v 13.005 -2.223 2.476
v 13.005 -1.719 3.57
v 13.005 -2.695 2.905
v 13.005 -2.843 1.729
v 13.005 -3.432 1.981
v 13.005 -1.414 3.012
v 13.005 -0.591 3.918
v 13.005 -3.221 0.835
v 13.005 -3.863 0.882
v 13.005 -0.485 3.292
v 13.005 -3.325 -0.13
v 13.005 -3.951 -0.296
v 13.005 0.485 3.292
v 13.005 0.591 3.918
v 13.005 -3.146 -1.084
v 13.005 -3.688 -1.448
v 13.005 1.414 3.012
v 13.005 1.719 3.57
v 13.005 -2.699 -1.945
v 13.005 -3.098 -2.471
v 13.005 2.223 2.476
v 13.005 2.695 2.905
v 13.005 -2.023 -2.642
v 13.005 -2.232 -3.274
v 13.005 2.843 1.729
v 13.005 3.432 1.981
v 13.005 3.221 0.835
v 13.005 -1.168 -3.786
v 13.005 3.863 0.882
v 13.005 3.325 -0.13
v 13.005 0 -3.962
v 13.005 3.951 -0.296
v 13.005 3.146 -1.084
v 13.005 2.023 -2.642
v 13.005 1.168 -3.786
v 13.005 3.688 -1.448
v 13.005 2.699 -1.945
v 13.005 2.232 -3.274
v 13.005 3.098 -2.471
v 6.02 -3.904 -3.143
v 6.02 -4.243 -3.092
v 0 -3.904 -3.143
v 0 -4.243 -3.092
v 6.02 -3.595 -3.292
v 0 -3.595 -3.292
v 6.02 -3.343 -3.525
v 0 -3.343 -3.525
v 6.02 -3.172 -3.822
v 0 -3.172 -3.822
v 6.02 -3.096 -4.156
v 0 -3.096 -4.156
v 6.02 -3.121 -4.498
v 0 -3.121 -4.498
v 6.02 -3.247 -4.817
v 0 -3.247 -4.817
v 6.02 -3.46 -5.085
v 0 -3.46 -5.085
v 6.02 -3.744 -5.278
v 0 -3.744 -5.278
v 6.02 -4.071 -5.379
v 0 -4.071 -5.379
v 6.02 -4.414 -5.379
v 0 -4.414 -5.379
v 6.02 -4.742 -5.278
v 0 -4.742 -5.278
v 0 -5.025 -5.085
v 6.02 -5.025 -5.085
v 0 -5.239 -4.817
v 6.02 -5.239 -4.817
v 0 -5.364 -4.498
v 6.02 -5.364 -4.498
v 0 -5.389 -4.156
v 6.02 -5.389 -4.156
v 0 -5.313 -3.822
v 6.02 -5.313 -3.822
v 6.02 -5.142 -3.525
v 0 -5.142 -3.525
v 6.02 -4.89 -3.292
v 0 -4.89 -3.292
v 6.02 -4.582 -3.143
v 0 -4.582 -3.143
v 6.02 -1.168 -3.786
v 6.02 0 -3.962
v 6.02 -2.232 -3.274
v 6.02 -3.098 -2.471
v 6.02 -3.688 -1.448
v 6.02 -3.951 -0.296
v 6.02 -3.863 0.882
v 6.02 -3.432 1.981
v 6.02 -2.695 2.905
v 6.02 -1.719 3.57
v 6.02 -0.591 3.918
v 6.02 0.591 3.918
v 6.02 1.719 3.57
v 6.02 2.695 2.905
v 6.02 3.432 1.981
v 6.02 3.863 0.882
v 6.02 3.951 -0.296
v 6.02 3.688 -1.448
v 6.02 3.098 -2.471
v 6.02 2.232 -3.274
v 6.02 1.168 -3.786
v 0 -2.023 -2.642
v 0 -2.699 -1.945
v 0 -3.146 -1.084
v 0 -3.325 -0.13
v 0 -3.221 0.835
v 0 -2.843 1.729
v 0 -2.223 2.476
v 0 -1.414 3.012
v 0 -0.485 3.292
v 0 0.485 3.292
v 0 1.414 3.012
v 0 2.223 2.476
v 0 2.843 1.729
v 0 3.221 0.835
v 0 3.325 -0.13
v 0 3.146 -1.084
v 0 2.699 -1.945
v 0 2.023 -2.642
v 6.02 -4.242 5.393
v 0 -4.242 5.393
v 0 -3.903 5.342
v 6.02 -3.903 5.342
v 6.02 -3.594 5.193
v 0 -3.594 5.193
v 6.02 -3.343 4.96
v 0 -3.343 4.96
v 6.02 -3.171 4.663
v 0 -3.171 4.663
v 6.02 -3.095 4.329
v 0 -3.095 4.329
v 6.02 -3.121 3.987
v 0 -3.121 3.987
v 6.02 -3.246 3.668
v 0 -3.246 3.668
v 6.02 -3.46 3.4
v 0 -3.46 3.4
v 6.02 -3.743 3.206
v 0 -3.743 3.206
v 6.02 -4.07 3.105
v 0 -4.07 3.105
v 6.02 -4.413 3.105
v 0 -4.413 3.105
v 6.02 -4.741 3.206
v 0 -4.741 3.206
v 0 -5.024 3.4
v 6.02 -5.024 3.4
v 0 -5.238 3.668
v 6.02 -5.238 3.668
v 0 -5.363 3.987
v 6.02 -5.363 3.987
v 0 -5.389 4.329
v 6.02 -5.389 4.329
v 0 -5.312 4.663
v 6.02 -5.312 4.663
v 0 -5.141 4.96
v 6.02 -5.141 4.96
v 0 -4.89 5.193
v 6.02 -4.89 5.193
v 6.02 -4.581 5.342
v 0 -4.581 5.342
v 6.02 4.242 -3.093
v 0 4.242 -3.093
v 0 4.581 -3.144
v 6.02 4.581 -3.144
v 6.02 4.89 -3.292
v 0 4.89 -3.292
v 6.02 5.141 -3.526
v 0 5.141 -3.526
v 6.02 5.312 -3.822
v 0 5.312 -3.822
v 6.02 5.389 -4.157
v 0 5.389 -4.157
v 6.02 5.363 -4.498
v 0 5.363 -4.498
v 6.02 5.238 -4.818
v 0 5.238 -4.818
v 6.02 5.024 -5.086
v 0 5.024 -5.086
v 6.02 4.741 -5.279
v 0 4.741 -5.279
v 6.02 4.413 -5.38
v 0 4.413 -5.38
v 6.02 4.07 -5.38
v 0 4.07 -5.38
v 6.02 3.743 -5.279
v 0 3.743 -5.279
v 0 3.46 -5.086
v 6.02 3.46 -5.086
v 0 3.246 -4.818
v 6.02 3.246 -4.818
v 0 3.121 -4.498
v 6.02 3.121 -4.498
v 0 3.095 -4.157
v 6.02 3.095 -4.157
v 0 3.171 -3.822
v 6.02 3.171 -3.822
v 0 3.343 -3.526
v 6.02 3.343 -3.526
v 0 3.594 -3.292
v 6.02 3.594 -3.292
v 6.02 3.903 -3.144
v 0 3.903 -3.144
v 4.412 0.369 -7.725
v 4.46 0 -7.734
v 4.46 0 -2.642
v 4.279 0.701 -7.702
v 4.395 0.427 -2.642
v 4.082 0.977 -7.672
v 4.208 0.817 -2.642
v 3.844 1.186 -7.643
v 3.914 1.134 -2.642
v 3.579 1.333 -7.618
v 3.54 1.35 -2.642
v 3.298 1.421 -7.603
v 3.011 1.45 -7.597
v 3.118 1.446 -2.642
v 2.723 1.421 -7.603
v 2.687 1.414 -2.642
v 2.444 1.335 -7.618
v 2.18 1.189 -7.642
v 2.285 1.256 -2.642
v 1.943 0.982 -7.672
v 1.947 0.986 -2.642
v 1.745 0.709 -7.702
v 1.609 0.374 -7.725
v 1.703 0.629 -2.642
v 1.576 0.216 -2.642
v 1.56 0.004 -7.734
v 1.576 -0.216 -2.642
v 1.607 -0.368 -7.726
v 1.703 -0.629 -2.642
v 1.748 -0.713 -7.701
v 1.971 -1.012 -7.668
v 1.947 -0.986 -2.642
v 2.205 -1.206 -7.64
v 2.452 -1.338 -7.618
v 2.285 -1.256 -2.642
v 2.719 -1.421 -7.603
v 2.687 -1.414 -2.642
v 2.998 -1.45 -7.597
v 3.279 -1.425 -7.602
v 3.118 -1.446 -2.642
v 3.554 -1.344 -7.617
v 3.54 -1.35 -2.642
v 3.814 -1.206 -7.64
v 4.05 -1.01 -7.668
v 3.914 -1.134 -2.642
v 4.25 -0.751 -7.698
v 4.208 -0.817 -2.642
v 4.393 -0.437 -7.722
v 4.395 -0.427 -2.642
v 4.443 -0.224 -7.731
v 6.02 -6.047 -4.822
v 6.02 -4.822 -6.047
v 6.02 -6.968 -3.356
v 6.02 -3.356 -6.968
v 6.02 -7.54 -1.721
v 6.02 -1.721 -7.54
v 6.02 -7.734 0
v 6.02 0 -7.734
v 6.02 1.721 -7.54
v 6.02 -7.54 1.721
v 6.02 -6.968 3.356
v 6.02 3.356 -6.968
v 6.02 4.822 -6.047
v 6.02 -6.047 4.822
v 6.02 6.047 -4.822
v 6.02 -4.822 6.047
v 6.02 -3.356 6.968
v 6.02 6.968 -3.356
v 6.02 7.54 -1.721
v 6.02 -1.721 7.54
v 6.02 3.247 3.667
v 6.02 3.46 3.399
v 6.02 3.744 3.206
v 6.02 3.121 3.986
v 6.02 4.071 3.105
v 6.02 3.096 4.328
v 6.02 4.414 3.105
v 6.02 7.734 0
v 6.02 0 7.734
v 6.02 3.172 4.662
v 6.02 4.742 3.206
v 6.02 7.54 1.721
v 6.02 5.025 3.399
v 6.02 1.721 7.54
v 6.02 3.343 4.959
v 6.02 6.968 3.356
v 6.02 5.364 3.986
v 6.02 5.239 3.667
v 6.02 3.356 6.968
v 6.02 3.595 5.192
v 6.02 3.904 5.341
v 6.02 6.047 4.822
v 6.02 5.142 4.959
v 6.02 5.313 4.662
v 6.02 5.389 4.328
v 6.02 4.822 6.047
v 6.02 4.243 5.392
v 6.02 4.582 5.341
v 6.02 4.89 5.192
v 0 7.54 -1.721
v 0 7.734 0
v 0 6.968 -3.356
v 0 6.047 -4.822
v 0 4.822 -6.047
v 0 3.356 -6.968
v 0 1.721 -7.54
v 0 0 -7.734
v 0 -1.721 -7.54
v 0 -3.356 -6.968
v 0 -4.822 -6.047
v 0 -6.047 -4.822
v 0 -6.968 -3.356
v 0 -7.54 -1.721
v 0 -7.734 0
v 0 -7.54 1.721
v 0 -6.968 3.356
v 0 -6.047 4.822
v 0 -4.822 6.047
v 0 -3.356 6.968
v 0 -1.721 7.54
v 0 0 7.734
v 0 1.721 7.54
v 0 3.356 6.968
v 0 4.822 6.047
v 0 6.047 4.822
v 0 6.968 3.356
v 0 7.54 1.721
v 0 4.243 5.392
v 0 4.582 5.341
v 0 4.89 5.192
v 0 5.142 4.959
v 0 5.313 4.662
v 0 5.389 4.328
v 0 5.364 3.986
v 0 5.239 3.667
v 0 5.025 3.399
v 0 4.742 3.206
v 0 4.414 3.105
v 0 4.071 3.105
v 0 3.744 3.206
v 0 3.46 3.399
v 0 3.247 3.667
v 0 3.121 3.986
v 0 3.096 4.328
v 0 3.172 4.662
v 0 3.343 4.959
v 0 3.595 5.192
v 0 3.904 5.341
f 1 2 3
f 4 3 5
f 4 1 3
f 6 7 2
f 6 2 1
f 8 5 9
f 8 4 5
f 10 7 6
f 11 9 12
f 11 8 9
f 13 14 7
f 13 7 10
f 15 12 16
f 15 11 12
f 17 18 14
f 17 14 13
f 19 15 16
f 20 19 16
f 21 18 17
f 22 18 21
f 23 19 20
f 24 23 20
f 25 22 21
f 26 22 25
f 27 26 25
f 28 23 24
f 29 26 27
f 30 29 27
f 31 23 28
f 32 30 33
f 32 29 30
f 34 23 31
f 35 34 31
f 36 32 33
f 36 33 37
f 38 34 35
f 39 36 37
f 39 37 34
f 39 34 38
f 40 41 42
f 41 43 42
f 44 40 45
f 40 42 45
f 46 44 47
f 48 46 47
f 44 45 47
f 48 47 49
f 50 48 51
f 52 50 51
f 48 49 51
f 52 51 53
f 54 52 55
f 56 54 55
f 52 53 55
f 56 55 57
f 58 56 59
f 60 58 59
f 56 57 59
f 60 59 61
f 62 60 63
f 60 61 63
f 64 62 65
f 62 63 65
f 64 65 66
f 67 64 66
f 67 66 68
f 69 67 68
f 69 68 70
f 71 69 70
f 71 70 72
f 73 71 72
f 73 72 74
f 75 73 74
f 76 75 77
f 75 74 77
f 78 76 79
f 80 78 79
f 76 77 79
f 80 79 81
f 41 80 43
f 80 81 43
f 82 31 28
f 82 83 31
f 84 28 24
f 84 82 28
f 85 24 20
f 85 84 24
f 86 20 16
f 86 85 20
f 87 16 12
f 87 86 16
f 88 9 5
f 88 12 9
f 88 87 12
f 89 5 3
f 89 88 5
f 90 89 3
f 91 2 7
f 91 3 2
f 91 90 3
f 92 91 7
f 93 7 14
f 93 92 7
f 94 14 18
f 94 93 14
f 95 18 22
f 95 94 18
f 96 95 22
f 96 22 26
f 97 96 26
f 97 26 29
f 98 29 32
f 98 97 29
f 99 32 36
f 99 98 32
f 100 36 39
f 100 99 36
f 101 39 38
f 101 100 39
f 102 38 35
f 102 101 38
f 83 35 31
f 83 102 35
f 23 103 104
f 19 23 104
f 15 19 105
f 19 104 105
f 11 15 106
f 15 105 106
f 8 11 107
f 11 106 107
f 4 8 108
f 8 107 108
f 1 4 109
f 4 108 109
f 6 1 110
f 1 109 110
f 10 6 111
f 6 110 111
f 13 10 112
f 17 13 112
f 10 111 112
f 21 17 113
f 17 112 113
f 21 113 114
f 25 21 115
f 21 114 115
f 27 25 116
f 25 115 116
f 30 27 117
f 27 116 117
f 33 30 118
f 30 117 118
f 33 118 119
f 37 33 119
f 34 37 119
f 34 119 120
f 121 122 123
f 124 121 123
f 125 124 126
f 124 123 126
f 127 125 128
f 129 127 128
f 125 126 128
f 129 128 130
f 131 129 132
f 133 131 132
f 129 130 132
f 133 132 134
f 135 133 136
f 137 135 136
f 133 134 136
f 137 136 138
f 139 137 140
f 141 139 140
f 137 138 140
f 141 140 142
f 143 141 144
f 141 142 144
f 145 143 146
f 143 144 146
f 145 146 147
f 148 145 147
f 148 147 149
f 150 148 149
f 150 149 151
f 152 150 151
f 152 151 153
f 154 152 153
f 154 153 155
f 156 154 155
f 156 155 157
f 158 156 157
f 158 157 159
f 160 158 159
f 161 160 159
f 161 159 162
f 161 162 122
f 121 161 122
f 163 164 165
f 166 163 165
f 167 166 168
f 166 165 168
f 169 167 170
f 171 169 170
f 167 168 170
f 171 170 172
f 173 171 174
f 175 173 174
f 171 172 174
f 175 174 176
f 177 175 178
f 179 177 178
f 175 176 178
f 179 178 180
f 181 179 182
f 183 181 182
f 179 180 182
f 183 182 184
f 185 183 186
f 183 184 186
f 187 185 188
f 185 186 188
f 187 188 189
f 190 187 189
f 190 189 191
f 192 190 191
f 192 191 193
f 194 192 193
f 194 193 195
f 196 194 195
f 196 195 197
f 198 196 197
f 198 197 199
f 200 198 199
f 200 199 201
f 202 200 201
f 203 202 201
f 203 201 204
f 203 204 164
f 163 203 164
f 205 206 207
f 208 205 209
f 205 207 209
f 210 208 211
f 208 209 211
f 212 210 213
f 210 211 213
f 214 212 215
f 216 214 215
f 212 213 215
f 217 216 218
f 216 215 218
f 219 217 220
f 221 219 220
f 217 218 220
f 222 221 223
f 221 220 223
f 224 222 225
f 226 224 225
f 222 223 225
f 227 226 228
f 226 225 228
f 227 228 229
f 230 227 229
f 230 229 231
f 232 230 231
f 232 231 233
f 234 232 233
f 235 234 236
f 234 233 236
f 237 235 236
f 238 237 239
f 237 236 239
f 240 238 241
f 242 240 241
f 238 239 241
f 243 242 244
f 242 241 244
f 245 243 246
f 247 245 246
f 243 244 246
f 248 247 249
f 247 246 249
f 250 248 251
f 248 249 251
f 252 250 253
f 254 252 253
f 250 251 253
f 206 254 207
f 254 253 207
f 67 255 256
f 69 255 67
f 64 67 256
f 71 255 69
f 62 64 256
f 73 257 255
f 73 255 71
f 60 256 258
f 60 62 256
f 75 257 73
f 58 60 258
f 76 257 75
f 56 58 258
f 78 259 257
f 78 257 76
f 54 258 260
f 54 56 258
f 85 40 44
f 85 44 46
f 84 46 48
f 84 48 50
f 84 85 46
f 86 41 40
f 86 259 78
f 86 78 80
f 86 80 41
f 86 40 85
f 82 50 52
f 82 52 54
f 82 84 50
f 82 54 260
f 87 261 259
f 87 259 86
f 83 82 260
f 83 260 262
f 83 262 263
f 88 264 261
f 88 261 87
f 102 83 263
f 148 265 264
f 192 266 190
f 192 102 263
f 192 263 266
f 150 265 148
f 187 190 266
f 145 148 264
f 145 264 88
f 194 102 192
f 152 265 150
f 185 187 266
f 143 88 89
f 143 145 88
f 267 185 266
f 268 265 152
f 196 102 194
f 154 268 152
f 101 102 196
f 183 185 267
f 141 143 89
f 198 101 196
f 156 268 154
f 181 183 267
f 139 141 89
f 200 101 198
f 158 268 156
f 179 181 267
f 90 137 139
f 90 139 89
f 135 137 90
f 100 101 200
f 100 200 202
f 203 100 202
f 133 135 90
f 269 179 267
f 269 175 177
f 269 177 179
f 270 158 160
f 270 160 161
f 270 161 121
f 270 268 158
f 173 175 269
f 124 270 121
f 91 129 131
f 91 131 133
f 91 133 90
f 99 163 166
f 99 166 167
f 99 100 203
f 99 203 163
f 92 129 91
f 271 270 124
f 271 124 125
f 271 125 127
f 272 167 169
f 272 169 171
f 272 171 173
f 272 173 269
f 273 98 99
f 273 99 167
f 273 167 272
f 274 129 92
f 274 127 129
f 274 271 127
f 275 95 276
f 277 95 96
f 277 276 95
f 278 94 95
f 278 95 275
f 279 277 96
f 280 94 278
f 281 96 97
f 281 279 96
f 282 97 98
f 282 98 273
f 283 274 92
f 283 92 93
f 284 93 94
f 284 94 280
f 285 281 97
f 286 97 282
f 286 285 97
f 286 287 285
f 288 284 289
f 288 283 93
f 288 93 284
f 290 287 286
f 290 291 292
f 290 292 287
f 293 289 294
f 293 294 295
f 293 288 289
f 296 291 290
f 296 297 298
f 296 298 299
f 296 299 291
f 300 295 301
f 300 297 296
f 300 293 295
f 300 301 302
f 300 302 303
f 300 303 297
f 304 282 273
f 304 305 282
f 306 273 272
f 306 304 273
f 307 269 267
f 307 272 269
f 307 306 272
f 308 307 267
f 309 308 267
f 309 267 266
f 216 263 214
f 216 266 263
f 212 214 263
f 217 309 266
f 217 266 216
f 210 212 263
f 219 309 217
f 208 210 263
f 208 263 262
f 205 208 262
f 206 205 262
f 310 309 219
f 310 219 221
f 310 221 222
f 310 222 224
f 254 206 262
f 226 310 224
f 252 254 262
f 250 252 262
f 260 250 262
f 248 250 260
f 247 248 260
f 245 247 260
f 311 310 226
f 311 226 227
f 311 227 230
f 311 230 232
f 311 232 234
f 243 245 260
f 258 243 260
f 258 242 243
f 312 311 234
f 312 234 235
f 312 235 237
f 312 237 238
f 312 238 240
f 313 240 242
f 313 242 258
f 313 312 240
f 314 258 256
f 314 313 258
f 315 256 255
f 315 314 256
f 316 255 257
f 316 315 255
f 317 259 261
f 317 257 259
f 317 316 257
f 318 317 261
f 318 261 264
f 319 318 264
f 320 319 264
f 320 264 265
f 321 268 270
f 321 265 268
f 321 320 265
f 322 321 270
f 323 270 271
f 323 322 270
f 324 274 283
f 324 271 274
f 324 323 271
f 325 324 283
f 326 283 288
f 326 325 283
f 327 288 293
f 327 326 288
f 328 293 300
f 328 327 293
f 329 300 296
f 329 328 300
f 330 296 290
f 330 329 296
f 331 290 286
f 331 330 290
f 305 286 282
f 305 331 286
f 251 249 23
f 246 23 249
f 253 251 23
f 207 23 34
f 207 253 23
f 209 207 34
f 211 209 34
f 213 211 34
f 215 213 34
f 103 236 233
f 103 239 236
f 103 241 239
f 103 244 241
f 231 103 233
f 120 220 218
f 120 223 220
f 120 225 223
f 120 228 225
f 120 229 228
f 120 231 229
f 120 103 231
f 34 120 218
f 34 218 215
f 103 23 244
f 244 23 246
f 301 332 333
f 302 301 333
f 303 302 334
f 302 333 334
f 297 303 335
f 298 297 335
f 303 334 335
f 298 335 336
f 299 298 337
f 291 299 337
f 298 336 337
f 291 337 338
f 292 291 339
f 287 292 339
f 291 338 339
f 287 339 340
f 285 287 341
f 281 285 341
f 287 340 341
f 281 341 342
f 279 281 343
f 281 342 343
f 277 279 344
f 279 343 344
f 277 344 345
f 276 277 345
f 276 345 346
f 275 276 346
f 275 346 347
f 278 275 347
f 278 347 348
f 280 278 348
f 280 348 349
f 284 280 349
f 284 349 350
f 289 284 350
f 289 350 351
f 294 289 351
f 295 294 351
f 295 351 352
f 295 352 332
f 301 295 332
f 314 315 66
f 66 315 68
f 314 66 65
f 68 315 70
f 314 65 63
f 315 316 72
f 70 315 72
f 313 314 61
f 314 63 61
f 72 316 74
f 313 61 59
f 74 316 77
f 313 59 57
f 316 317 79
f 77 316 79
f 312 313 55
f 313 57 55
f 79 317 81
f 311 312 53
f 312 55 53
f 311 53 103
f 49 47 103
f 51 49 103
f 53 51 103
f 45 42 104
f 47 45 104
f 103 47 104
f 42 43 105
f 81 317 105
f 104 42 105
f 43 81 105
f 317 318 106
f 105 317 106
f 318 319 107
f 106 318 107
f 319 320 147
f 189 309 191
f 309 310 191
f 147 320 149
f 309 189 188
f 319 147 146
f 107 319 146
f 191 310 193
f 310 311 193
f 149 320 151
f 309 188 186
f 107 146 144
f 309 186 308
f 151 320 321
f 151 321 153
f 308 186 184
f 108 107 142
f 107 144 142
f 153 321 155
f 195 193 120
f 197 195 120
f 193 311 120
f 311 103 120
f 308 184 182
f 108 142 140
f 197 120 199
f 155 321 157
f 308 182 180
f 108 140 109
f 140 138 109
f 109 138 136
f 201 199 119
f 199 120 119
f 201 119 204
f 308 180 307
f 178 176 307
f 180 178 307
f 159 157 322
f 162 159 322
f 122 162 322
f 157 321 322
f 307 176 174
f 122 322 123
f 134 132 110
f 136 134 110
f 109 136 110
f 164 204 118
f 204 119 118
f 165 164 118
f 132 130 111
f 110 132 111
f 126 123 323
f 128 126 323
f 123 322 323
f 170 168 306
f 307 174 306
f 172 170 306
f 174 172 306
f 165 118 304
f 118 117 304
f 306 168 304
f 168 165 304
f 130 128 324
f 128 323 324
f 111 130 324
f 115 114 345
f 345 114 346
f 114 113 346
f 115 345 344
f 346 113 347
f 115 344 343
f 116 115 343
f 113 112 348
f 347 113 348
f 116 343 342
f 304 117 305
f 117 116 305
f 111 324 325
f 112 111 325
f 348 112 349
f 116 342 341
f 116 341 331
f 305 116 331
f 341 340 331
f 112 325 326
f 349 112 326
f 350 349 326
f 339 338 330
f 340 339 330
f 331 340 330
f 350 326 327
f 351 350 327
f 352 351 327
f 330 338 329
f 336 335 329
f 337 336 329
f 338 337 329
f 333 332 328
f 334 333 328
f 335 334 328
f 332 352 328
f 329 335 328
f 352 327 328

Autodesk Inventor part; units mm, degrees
ref_plane "YZ Plane" through (0, 0, 0) normal (1, 0, 0) x (0, 1, 0)
ref_plane "XZ Plane" through (0, 0, 0) normal (0, 1, 0) x (-1, 0, 0)
ref_plane "XY Plane" through (0, 0, 0) normal (0, 0, 1) x (1, 0, 0)
sketch "Sketch1" plane through (0, 0, 0) normal (1, 0, 0) x (0, 1, 0)
  circle A0 centre (0, 0) radius 7.7343
  dimension "d0" = 15.4686
extrude "Extrusion1" add sketch "Sketch1" along normal blind 6.0198
sketch "Sketch2" plane through (6.0198, 0, 0) normal (1, 0, 0) x (0, 0, -1)
  circle A0 centre (0, 0) radius 3.9624
  dimension "d3" = 7.9248
extrude "Extrusion2" add sketch "Sketch2" along normal blind 6.985
sketch "Sketch3" plane through (0, 0, 0) normal (-1, 0, 0) x (0, 0, 1)
  arc A0 (-2.6416, -2.0232) -> (-2.6416, 2.0232) centre (0, 0) ccw
  line L0 (-2.6416, -2.0232) -> (-2.6416, 2.0232)
  dimension "d6" = 6.6548
extrude "Extrusion3" cut sketch "Sketch3" against normal through all
sketch "Sketch4" plane through (0, 0, 0) normal (-1, 0, 0) x (0, 0, 1)
  circle A0 centre (-4.2426, 4.2418) radius 1.15
  circle A1 centre (0, 0) radius 6 construction
  circle A2 centre (-4.2418, -4.2426) radius 1.15
  circle A3 centre (4.2426, -4.2418) radius 1.15
  circle A4 centre (4.2418, 4.2426) radius 1.15
  dimension "d12" = 2.3
  dimension "d21" = 12
  dimension "d24" = 360
extrude "Extrusion4" cut sketch "Sketch4" against normal through all
sketch "Sketch5" plane through (0, -2.0232, -2.6416) normal (0, 0, 1) x (1, 0, 0)
  circle A0 centre (3.0099, 2.0232) radius 1.45
  line L0 (6.0198, -5.7111) -> (6.0198, 9.7575) projected
  line L1 (0, 9.7575) -> (0, -5.7111) projected
  line L2 (6.0198, 5.9856) -> (13.0048, 5.9856) construction
  line L3 (13.0048, -1.9392) -> (13.0048, 5.9856) construction
  line L4 (6.0198, 5.9856) -> (6.0198, -1.9392) construction
  line L5 (0, 9.7575) -> (6.0198, 9.7575) construction
  line L6 (0, -5.7111) -> (6.0198, -5.7111) construction
  point P0 (0, 2.0232)
  dimension "d26" = 2.9
  dimension "d27" = 6.0198
  dimension "d28" = 3.0099
  dimension "d29" = 15.4686
  dimension "d30" = 7.7343
extrude "Extrusion5" cut sketch "Sketch5" against normal through all
equation "\"d28\" = 0.5 * d27"
equation "\"d30\" = 0.5 * d29"
properties part number "Our omiwheelinsert"
